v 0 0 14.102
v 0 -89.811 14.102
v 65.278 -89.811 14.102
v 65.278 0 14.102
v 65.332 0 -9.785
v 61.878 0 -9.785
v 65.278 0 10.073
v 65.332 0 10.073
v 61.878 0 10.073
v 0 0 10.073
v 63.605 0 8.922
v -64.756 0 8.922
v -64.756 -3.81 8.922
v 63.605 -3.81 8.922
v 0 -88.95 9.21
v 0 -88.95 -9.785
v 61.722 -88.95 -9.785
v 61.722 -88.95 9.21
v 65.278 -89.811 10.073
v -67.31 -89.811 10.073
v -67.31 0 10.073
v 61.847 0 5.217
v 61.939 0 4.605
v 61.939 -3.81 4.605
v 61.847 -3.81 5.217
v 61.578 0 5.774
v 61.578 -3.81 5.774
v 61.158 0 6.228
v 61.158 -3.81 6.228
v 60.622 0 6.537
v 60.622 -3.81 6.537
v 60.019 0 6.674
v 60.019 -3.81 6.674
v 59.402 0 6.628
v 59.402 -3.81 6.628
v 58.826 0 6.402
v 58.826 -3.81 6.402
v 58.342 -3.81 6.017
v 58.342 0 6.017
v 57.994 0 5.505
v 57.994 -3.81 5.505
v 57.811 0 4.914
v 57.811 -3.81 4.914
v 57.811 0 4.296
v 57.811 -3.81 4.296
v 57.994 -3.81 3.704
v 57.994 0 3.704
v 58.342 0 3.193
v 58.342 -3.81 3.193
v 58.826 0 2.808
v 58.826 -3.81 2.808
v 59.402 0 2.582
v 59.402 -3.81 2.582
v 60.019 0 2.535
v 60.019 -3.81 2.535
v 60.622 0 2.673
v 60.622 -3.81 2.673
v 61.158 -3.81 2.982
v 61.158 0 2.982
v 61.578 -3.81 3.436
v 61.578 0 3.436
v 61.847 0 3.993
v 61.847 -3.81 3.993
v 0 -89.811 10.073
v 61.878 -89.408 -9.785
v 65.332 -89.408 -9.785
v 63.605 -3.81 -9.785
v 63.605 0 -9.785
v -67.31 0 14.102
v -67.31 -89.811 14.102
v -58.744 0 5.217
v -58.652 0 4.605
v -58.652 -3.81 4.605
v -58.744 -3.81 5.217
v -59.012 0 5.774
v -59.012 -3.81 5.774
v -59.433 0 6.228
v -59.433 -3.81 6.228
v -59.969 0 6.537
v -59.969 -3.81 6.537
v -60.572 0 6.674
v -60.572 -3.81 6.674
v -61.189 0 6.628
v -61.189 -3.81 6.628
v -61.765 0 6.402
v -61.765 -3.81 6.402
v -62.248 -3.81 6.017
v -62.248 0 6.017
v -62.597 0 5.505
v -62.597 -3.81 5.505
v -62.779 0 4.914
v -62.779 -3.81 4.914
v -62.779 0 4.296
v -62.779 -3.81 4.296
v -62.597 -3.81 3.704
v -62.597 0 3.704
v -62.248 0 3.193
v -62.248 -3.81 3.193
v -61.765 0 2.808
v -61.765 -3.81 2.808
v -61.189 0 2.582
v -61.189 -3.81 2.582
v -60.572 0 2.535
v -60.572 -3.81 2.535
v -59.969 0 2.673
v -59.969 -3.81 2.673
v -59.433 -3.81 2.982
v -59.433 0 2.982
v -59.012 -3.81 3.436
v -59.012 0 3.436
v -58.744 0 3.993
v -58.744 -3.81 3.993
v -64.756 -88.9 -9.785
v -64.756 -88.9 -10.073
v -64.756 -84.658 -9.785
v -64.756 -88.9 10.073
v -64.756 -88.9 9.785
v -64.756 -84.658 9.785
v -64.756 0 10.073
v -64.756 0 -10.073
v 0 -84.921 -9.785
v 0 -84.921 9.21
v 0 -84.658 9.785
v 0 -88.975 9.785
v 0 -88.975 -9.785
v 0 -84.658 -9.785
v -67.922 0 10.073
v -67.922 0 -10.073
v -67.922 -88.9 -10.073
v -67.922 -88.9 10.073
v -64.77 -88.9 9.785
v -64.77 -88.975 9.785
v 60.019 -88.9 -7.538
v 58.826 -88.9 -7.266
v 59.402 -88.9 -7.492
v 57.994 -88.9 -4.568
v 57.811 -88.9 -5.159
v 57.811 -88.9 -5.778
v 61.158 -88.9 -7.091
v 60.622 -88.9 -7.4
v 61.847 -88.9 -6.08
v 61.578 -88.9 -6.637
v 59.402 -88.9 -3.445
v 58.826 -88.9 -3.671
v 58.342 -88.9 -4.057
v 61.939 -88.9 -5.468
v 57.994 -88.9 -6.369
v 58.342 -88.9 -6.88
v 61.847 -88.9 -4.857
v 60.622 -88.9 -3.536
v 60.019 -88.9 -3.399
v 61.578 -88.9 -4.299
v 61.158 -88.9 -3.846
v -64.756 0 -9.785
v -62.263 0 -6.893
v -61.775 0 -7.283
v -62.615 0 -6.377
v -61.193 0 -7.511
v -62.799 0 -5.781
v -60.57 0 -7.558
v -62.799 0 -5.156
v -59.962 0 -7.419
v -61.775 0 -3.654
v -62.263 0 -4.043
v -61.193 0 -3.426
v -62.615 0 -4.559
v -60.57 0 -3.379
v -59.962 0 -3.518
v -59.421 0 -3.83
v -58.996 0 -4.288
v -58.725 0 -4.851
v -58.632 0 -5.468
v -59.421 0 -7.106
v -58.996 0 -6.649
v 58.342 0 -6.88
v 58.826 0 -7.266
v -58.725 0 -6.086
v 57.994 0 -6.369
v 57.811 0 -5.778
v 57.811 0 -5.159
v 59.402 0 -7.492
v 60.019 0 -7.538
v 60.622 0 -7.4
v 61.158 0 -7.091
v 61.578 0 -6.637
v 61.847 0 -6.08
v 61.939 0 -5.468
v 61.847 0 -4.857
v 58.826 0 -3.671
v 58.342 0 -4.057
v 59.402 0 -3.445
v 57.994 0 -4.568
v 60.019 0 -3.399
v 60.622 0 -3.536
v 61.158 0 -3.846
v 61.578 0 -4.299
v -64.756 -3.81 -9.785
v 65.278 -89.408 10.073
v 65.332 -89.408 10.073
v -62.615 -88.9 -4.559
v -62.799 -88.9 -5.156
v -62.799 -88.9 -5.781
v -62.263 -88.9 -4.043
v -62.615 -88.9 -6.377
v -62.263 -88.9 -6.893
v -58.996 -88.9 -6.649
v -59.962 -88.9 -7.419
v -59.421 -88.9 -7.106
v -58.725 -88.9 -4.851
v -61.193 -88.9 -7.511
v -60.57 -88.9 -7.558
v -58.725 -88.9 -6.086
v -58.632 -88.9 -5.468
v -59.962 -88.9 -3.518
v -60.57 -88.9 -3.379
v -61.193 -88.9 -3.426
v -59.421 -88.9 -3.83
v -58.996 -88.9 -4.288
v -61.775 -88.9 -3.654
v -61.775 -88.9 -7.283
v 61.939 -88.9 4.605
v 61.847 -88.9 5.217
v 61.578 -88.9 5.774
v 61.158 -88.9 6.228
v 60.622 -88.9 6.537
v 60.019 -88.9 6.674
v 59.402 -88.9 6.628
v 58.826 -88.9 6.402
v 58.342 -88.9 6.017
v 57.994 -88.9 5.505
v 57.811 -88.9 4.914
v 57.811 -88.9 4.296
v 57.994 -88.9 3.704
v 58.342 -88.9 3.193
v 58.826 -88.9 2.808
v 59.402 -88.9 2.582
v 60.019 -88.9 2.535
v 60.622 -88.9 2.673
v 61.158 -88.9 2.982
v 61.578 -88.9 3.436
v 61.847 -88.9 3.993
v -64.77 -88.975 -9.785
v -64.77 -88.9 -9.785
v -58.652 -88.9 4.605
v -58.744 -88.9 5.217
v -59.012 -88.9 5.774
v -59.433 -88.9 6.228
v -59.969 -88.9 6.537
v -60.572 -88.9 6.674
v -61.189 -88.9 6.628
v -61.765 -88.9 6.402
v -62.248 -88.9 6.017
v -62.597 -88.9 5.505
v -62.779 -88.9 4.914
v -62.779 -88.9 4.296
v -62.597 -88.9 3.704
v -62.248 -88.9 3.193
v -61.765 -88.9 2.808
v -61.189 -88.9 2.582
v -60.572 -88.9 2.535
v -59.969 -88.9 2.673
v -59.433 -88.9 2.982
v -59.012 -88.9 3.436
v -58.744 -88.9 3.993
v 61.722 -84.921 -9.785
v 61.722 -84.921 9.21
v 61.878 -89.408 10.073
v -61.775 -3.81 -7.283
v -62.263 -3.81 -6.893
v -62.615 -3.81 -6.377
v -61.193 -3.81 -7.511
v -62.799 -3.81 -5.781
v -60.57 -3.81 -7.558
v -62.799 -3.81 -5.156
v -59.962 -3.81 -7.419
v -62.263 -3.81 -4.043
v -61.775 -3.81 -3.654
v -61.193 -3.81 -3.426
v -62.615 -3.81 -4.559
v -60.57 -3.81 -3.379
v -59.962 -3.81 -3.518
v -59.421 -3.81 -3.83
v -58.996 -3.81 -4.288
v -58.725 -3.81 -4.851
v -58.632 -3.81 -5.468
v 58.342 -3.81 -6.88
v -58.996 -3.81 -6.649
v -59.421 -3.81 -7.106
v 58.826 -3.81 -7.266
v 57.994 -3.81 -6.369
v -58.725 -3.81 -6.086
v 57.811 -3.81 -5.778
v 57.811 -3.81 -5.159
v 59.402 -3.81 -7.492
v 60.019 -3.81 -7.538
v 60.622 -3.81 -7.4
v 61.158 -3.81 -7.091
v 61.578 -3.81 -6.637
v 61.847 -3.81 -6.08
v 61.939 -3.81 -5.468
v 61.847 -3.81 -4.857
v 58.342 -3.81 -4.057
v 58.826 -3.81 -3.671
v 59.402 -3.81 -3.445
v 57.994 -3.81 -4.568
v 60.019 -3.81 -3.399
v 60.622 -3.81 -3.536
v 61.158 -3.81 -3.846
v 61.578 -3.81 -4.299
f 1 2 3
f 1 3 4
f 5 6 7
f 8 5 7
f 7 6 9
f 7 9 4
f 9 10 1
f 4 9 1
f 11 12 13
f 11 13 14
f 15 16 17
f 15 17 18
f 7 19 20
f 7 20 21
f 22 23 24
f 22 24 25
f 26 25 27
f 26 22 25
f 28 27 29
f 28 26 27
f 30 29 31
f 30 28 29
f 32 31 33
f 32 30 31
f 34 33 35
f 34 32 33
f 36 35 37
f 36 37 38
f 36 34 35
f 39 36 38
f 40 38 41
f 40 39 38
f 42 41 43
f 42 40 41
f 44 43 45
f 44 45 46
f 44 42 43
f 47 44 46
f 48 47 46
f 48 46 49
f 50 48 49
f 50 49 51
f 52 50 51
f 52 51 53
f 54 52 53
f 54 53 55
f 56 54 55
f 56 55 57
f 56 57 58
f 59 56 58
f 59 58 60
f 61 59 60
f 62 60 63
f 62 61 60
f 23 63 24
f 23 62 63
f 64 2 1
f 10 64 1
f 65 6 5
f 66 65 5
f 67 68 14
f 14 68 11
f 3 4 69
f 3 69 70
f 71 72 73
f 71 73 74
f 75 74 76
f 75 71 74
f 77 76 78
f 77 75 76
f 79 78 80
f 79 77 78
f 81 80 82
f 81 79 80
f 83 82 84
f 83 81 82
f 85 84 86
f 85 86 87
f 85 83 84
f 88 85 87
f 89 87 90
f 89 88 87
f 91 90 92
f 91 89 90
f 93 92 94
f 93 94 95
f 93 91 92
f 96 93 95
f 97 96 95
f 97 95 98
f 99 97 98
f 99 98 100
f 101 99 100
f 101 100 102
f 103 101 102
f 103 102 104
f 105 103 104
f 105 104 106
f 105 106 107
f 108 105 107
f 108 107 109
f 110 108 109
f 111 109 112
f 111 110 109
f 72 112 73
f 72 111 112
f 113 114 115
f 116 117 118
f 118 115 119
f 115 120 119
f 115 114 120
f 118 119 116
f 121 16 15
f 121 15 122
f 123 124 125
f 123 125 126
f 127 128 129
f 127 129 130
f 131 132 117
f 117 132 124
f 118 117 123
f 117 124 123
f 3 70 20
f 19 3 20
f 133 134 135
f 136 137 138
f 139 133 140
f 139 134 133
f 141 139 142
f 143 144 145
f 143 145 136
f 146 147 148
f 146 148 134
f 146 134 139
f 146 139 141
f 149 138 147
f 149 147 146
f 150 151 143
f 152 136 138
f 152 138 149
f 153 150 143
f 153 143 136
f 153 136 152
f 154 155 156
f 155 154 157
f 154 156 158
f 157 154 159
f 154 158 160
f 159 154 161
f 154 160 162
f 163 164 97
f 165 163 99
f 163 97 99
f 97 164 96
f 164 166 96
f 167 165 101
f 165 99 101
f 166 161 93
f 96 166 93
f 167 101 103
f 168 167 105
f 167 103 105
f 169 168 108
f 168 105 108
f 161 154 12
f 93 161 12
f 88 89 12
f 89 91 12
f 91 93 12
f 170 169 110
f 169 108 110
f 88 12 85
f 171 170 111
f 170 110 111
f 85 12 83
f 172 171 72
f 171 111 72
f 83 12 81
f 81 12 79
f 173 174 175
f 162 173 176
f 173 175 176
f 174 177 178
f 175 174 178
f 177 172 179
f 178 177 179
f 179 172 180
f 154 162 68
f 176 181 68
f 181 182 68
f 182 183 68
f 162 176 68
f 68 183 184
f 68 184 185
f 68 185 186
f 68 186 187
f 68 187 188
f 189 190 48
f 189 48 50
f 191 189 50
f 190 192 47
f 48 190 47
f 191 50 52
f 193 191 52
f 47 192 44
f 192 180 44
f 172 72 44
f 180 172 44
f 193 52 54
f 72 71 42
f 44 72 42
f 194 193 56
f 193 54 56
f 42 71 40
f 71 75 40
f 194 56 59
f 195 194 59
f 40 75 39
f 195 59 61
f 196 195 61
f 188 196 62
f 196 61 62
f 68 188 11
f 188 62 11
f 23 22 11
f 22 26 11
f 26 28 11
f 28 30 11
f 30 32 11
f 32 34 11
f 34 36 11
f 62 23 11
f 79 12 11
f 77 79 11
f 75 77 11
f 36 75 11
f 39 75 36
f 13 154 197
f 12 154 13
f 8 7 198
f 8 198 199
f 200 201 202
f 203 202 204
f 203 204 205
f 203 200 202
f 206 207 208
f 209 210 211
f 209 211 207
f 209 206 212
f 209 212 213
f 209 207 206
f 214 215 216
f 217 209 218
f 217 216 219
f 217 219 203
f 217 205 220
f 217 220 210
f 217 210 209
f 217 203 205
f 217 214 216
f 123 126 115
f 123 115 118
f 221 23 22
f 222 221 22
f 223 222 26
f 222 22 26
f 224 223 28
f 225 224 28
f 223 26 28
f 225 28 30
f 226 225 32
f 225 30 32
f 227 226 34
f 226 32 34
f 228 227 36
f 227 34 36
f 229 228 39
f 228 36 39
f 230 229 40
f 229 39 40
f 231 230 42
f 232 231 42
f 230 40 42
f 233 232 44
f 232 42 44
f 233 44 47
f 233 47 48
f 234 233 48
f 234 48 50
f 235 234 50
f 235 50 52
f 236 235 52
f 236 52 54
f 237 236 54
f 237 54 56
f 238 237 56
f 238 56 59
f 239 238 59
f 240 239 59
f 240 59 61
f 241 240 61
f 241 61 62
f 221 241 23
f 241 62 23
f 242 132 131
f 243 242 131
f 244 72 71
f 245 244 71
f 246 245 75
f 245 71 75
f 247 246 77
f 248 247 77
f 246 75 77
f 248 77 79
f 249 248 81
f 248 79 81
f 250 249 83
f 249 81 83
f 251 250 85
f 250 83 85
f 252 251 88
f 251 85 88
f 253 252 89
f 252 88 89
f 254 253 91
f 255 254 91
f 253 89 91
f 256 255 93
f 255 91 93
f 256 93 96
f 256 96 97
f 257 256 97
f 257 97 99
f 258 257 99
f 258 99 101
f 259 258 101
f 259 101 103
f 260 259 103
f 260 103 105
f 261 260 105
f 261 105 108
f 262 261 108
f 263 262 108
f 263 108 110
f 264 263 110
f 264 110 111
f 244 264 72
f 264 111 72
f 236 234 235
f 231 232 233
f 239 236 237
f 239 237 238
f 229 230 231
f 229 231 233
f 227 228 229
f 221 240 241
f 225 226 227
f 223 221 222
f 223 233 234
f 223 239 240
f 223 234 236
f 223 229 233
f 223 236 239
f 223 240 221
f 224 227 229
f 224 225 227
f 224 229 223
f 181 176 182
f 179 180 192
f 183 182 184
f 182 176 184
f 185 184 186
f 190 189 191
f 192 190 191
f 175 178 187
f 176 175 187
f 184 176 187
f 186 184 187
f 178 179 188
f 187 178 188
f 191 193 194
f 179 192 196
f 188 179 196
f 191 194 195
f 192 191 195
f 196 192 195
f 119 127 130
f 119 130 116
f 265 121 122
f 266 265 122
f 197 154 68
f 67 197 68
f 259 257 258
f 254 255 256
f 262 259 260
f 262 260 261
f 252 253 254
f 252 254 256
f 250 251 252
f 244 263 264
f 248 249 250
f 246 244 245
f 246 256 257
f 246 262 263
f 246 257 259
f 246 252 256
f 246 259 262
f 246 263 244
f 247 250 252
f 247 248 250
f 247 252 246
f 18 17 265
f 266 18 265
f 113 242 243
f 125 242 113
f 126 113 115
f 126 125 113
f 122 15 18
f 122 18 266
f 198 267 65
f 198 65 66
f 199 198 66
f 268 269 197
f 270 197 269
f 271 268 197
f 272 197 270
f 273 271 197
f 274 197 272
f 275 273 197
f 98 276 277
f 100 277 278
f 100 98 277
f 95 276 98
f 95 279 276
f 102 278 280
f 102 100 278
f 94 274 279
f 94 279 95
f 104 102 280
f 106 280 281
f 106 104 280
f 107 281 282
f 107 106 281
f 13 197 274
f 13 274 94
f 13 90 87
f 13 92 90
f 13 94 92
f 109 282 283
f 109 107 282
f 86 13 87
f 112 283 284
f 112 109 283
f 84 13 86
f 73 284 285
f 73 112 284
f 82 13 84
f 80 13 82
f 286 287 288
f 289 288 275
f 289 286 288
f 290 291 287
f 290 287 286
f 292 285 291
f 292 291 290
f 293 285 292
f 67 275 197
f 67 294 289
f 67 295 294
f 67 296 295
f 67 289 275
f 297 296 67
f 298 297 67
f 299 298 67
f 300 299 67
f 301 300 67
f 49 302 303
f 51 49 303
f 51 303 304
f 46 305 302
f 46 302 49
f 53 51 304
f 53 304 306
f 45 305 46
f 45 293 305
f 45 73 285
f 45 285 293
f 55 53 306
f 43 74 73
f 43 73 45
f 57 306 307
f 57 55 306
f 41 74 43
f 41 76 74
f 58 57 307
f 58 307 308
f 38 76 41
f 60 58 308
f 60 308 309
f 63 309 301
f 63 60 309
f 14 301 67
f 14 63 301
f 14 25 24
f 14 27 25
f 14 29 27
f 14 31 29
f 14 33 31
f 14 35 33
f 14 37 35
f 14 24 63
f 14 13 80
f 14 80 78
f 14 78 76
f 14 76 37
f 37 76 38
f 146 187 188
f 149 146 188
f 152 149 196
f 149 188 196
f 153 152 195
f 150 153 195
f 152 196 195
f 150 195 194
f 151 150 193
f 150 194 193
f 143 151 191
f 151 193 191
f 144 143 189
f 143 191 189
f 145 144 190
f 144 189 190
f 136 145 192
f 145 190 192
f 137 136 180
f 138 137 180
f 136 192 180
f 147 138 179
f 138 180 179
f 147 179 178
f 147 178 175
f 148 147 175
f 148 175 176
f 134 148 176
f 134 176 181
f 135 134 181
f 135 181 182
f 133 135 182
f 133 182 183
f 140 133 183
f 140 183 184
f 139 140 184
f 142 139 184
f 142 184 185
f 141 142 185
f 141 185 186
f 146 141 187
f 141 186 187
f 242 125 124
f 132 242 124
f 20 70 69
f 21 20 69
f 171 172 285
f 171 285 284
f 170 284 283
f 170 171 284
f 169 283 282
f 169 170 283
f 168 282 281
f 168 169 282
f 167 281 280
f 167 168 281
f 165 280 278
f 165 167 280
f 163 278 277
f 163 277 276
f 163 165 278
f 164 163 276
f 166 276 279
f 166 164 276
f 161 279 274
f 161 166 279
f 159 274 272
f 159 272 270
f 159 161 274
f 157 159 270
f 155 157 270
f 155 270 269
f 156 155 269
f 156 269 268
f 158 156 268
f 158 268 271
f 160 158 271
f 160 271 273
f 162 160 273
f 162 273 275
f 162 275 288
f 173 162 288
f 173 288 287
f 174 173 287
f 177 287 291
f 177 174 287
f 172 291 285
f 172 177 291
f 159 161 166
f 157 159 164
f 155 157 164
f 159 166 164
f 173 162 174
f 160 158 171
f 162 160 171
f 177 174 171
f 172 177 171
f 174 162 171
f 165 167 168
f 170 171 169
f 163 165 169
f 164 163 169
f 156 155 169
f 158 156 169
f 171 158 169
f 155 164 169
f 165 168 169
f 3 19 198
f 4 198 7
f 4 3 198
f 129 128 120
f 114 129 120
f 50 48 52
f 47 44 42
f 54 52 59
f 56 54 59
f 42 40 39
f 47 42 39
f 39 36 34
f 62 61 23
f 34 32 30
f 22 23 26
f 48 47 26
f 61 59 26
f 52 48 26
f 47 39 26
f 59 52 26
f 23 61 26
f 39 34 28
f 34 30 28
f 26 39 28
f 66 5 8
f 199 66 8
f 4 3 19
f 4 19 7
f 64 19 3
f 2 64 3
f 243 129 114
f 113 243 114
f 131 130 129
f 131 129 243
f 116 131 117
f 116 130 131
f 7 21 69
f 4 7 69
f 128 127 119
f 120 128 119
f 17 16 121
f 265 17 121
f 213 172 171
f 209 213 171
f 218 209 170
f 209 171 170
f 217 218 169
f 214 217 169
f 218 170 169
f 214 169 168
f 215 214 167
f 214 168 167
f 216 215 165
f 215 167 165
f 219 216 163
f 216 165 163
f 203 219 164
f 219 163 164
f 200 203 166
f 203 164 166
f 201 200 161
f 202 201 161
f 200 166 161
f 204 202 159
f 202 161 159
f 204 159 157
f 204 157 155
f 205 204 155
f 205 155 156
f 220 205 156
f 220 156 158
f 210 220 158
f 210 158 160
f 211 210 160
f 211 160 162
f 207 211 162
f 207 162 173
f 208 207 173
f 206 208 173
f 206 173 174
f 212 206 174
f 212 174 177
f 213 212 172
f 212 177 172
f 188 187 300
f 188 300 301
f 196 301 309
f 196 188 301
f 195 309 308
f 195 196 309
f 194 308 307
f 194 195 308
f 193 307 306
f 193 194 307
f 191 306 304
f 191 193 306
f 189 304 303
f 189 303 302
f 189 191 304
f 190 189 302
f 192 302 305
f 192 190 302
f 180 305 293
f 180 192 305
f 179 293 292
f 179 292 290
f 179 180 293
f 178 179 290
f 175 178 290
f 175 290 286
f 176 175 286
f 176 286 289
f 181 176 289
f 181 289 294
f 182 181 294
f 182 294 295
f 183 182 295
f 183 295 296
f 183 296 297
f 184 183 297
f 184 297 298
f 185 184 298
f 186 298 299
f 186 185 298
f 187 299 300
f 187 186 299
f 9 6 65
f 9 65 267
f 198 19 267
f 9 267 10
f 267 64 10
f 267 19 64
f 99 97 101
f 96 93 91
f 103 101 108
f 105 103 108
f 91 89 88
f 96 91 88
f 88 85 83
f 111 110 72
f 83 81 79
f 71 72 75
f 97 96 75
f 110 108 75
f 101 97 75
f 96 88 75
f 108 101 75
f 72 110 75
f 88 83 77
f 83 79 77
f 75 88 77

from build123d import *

# Parameters (mm, degrees)
F0_R      = 2.095261
F0_R_2    = 2.075397
F0_R_3    = 2.075398
F1_DEPTH  = 88.9
F2_W      = 4.029281
F2_H      = 18.995181
F3_DEPTH  = 61.722
F4_W      = 4.31709
F4_H      = 19.570792
F5_DEPTH  = 64.77
F6_W      = 3.165863
F6_H      = 20.146404
F7_DEPTH  = 88.9
F6_W_2    = 3.453664
F6_H_2    = 19.858598
F8_DEPTH  = 89.408
F0_W      = 128.361375
F0_H      = 18.707374
F9_DEPTH  = 3.81
F10_W     = 89.81093
F10_H     = 4.02928
F11_DEPTH = 65.278
F12_DEPTH = 132.588


with BuildPart() as f1:
    # F0 (on Front) → F1 (new body)
    with BuildSketch(Plane.XZ):
        with Locations((-60.727015, -5.468309)):
            Circle(F0_R)
        with Locations((-60.727015, 4.604892)):
            Circle(F0_R_2)
        with Locations((59.863601, 4.604892)):
            Circle(F0_R_2)
        with Locations((59.863601, -5.468309)):
            Circle(F0_R_3)
    extrude(amount=F1_DEPTH)


with BuildPart() as f3:
    # F2 (on Right) → F3 (new body)
    with BuildSketch(Plane.YZ):
        with Locations((-86.935613, -0.287806)):
            Rectangle(F2_W, F2_H)
    extrude(amount=F3_DEPTH)


with BuildPart() as f5:
    # F4 (on Right) → F5 (new body)
    with BuildSketch(Plane.YZ):
        with Locations((-86.816832, 0)):
            Rectangle(F4_W, F4_H)
    extrude(amount=-F5_DEPTH)

    # F6 (on Front) → F7 (join)
    with BuildSketch(Plane.XZ):
        with Locations((-66.339228, 0)):
            Rectangle(F6_W, F6_H)
    extrude(amount=F7_DEPTH)


with BuildPart() as f8:
    # F6 (on Front) → F8 (new body)
    with BuildSketch(Plane.XZ):
        with Locations((63.605074, 0.143903)):
            Rectangle(F6_W_2, F6_H_2)
    extrude(amount=F8_DEPTH)

    # F10 (on Right) → F11 (join)
    with BuildSketch(Plane.YZ):
        with Locations((-44.905465, 12.087842)):
            Rectangle(F10_W, F10_H)
    extrude(amount=F11_DEPTH)


with BuildPart() as f9:
    # F0 (on Front) → F9 (new body)
    with BuildSketch(Plane.XZ):
        with Locations((-0.57561, -0.431709)):
            Rectangle(F0_W, F0_H)
        with Locations((-60.727015, -5.468309)):
            Circle(F0_R, mode=Mode.SUBTRACT)
        with Locations((59.863601, -5.468309)):
            Circle(F0_R_3, mode=Mode.SUBTRACT)
        with Locations((-60.727015, 4.604892)):
            Circle(F0_R_2, mode=Mode.SUBTRACT)
        with Locations((59.863601, 4.604892)):
            Circle(F0_R_2, mode=Mode.SUBTRACT)
    extrude(amount=F9_DEPTH)


with BuildPart() as f12:
    # F11_face (on face) → F12 (new body)
    with BuildSketch(Plane(origin=(65.278, -44.905465, 12.087842), x_dir=(0, 1, 0), z_dir=(1, 0, 0))):
        Polygon((44.905465, 2.01464), (-44.905465, 2.01464), (-44.905465, -2.01464), (-44.502535, -2.01464), (44.905465, -2.01464), align=None)
    extrude(amount=-F12_DEPTH)


solid = Compound([f1.part, f3.part, f5.part, f8.part, f9.part, f12.part])
